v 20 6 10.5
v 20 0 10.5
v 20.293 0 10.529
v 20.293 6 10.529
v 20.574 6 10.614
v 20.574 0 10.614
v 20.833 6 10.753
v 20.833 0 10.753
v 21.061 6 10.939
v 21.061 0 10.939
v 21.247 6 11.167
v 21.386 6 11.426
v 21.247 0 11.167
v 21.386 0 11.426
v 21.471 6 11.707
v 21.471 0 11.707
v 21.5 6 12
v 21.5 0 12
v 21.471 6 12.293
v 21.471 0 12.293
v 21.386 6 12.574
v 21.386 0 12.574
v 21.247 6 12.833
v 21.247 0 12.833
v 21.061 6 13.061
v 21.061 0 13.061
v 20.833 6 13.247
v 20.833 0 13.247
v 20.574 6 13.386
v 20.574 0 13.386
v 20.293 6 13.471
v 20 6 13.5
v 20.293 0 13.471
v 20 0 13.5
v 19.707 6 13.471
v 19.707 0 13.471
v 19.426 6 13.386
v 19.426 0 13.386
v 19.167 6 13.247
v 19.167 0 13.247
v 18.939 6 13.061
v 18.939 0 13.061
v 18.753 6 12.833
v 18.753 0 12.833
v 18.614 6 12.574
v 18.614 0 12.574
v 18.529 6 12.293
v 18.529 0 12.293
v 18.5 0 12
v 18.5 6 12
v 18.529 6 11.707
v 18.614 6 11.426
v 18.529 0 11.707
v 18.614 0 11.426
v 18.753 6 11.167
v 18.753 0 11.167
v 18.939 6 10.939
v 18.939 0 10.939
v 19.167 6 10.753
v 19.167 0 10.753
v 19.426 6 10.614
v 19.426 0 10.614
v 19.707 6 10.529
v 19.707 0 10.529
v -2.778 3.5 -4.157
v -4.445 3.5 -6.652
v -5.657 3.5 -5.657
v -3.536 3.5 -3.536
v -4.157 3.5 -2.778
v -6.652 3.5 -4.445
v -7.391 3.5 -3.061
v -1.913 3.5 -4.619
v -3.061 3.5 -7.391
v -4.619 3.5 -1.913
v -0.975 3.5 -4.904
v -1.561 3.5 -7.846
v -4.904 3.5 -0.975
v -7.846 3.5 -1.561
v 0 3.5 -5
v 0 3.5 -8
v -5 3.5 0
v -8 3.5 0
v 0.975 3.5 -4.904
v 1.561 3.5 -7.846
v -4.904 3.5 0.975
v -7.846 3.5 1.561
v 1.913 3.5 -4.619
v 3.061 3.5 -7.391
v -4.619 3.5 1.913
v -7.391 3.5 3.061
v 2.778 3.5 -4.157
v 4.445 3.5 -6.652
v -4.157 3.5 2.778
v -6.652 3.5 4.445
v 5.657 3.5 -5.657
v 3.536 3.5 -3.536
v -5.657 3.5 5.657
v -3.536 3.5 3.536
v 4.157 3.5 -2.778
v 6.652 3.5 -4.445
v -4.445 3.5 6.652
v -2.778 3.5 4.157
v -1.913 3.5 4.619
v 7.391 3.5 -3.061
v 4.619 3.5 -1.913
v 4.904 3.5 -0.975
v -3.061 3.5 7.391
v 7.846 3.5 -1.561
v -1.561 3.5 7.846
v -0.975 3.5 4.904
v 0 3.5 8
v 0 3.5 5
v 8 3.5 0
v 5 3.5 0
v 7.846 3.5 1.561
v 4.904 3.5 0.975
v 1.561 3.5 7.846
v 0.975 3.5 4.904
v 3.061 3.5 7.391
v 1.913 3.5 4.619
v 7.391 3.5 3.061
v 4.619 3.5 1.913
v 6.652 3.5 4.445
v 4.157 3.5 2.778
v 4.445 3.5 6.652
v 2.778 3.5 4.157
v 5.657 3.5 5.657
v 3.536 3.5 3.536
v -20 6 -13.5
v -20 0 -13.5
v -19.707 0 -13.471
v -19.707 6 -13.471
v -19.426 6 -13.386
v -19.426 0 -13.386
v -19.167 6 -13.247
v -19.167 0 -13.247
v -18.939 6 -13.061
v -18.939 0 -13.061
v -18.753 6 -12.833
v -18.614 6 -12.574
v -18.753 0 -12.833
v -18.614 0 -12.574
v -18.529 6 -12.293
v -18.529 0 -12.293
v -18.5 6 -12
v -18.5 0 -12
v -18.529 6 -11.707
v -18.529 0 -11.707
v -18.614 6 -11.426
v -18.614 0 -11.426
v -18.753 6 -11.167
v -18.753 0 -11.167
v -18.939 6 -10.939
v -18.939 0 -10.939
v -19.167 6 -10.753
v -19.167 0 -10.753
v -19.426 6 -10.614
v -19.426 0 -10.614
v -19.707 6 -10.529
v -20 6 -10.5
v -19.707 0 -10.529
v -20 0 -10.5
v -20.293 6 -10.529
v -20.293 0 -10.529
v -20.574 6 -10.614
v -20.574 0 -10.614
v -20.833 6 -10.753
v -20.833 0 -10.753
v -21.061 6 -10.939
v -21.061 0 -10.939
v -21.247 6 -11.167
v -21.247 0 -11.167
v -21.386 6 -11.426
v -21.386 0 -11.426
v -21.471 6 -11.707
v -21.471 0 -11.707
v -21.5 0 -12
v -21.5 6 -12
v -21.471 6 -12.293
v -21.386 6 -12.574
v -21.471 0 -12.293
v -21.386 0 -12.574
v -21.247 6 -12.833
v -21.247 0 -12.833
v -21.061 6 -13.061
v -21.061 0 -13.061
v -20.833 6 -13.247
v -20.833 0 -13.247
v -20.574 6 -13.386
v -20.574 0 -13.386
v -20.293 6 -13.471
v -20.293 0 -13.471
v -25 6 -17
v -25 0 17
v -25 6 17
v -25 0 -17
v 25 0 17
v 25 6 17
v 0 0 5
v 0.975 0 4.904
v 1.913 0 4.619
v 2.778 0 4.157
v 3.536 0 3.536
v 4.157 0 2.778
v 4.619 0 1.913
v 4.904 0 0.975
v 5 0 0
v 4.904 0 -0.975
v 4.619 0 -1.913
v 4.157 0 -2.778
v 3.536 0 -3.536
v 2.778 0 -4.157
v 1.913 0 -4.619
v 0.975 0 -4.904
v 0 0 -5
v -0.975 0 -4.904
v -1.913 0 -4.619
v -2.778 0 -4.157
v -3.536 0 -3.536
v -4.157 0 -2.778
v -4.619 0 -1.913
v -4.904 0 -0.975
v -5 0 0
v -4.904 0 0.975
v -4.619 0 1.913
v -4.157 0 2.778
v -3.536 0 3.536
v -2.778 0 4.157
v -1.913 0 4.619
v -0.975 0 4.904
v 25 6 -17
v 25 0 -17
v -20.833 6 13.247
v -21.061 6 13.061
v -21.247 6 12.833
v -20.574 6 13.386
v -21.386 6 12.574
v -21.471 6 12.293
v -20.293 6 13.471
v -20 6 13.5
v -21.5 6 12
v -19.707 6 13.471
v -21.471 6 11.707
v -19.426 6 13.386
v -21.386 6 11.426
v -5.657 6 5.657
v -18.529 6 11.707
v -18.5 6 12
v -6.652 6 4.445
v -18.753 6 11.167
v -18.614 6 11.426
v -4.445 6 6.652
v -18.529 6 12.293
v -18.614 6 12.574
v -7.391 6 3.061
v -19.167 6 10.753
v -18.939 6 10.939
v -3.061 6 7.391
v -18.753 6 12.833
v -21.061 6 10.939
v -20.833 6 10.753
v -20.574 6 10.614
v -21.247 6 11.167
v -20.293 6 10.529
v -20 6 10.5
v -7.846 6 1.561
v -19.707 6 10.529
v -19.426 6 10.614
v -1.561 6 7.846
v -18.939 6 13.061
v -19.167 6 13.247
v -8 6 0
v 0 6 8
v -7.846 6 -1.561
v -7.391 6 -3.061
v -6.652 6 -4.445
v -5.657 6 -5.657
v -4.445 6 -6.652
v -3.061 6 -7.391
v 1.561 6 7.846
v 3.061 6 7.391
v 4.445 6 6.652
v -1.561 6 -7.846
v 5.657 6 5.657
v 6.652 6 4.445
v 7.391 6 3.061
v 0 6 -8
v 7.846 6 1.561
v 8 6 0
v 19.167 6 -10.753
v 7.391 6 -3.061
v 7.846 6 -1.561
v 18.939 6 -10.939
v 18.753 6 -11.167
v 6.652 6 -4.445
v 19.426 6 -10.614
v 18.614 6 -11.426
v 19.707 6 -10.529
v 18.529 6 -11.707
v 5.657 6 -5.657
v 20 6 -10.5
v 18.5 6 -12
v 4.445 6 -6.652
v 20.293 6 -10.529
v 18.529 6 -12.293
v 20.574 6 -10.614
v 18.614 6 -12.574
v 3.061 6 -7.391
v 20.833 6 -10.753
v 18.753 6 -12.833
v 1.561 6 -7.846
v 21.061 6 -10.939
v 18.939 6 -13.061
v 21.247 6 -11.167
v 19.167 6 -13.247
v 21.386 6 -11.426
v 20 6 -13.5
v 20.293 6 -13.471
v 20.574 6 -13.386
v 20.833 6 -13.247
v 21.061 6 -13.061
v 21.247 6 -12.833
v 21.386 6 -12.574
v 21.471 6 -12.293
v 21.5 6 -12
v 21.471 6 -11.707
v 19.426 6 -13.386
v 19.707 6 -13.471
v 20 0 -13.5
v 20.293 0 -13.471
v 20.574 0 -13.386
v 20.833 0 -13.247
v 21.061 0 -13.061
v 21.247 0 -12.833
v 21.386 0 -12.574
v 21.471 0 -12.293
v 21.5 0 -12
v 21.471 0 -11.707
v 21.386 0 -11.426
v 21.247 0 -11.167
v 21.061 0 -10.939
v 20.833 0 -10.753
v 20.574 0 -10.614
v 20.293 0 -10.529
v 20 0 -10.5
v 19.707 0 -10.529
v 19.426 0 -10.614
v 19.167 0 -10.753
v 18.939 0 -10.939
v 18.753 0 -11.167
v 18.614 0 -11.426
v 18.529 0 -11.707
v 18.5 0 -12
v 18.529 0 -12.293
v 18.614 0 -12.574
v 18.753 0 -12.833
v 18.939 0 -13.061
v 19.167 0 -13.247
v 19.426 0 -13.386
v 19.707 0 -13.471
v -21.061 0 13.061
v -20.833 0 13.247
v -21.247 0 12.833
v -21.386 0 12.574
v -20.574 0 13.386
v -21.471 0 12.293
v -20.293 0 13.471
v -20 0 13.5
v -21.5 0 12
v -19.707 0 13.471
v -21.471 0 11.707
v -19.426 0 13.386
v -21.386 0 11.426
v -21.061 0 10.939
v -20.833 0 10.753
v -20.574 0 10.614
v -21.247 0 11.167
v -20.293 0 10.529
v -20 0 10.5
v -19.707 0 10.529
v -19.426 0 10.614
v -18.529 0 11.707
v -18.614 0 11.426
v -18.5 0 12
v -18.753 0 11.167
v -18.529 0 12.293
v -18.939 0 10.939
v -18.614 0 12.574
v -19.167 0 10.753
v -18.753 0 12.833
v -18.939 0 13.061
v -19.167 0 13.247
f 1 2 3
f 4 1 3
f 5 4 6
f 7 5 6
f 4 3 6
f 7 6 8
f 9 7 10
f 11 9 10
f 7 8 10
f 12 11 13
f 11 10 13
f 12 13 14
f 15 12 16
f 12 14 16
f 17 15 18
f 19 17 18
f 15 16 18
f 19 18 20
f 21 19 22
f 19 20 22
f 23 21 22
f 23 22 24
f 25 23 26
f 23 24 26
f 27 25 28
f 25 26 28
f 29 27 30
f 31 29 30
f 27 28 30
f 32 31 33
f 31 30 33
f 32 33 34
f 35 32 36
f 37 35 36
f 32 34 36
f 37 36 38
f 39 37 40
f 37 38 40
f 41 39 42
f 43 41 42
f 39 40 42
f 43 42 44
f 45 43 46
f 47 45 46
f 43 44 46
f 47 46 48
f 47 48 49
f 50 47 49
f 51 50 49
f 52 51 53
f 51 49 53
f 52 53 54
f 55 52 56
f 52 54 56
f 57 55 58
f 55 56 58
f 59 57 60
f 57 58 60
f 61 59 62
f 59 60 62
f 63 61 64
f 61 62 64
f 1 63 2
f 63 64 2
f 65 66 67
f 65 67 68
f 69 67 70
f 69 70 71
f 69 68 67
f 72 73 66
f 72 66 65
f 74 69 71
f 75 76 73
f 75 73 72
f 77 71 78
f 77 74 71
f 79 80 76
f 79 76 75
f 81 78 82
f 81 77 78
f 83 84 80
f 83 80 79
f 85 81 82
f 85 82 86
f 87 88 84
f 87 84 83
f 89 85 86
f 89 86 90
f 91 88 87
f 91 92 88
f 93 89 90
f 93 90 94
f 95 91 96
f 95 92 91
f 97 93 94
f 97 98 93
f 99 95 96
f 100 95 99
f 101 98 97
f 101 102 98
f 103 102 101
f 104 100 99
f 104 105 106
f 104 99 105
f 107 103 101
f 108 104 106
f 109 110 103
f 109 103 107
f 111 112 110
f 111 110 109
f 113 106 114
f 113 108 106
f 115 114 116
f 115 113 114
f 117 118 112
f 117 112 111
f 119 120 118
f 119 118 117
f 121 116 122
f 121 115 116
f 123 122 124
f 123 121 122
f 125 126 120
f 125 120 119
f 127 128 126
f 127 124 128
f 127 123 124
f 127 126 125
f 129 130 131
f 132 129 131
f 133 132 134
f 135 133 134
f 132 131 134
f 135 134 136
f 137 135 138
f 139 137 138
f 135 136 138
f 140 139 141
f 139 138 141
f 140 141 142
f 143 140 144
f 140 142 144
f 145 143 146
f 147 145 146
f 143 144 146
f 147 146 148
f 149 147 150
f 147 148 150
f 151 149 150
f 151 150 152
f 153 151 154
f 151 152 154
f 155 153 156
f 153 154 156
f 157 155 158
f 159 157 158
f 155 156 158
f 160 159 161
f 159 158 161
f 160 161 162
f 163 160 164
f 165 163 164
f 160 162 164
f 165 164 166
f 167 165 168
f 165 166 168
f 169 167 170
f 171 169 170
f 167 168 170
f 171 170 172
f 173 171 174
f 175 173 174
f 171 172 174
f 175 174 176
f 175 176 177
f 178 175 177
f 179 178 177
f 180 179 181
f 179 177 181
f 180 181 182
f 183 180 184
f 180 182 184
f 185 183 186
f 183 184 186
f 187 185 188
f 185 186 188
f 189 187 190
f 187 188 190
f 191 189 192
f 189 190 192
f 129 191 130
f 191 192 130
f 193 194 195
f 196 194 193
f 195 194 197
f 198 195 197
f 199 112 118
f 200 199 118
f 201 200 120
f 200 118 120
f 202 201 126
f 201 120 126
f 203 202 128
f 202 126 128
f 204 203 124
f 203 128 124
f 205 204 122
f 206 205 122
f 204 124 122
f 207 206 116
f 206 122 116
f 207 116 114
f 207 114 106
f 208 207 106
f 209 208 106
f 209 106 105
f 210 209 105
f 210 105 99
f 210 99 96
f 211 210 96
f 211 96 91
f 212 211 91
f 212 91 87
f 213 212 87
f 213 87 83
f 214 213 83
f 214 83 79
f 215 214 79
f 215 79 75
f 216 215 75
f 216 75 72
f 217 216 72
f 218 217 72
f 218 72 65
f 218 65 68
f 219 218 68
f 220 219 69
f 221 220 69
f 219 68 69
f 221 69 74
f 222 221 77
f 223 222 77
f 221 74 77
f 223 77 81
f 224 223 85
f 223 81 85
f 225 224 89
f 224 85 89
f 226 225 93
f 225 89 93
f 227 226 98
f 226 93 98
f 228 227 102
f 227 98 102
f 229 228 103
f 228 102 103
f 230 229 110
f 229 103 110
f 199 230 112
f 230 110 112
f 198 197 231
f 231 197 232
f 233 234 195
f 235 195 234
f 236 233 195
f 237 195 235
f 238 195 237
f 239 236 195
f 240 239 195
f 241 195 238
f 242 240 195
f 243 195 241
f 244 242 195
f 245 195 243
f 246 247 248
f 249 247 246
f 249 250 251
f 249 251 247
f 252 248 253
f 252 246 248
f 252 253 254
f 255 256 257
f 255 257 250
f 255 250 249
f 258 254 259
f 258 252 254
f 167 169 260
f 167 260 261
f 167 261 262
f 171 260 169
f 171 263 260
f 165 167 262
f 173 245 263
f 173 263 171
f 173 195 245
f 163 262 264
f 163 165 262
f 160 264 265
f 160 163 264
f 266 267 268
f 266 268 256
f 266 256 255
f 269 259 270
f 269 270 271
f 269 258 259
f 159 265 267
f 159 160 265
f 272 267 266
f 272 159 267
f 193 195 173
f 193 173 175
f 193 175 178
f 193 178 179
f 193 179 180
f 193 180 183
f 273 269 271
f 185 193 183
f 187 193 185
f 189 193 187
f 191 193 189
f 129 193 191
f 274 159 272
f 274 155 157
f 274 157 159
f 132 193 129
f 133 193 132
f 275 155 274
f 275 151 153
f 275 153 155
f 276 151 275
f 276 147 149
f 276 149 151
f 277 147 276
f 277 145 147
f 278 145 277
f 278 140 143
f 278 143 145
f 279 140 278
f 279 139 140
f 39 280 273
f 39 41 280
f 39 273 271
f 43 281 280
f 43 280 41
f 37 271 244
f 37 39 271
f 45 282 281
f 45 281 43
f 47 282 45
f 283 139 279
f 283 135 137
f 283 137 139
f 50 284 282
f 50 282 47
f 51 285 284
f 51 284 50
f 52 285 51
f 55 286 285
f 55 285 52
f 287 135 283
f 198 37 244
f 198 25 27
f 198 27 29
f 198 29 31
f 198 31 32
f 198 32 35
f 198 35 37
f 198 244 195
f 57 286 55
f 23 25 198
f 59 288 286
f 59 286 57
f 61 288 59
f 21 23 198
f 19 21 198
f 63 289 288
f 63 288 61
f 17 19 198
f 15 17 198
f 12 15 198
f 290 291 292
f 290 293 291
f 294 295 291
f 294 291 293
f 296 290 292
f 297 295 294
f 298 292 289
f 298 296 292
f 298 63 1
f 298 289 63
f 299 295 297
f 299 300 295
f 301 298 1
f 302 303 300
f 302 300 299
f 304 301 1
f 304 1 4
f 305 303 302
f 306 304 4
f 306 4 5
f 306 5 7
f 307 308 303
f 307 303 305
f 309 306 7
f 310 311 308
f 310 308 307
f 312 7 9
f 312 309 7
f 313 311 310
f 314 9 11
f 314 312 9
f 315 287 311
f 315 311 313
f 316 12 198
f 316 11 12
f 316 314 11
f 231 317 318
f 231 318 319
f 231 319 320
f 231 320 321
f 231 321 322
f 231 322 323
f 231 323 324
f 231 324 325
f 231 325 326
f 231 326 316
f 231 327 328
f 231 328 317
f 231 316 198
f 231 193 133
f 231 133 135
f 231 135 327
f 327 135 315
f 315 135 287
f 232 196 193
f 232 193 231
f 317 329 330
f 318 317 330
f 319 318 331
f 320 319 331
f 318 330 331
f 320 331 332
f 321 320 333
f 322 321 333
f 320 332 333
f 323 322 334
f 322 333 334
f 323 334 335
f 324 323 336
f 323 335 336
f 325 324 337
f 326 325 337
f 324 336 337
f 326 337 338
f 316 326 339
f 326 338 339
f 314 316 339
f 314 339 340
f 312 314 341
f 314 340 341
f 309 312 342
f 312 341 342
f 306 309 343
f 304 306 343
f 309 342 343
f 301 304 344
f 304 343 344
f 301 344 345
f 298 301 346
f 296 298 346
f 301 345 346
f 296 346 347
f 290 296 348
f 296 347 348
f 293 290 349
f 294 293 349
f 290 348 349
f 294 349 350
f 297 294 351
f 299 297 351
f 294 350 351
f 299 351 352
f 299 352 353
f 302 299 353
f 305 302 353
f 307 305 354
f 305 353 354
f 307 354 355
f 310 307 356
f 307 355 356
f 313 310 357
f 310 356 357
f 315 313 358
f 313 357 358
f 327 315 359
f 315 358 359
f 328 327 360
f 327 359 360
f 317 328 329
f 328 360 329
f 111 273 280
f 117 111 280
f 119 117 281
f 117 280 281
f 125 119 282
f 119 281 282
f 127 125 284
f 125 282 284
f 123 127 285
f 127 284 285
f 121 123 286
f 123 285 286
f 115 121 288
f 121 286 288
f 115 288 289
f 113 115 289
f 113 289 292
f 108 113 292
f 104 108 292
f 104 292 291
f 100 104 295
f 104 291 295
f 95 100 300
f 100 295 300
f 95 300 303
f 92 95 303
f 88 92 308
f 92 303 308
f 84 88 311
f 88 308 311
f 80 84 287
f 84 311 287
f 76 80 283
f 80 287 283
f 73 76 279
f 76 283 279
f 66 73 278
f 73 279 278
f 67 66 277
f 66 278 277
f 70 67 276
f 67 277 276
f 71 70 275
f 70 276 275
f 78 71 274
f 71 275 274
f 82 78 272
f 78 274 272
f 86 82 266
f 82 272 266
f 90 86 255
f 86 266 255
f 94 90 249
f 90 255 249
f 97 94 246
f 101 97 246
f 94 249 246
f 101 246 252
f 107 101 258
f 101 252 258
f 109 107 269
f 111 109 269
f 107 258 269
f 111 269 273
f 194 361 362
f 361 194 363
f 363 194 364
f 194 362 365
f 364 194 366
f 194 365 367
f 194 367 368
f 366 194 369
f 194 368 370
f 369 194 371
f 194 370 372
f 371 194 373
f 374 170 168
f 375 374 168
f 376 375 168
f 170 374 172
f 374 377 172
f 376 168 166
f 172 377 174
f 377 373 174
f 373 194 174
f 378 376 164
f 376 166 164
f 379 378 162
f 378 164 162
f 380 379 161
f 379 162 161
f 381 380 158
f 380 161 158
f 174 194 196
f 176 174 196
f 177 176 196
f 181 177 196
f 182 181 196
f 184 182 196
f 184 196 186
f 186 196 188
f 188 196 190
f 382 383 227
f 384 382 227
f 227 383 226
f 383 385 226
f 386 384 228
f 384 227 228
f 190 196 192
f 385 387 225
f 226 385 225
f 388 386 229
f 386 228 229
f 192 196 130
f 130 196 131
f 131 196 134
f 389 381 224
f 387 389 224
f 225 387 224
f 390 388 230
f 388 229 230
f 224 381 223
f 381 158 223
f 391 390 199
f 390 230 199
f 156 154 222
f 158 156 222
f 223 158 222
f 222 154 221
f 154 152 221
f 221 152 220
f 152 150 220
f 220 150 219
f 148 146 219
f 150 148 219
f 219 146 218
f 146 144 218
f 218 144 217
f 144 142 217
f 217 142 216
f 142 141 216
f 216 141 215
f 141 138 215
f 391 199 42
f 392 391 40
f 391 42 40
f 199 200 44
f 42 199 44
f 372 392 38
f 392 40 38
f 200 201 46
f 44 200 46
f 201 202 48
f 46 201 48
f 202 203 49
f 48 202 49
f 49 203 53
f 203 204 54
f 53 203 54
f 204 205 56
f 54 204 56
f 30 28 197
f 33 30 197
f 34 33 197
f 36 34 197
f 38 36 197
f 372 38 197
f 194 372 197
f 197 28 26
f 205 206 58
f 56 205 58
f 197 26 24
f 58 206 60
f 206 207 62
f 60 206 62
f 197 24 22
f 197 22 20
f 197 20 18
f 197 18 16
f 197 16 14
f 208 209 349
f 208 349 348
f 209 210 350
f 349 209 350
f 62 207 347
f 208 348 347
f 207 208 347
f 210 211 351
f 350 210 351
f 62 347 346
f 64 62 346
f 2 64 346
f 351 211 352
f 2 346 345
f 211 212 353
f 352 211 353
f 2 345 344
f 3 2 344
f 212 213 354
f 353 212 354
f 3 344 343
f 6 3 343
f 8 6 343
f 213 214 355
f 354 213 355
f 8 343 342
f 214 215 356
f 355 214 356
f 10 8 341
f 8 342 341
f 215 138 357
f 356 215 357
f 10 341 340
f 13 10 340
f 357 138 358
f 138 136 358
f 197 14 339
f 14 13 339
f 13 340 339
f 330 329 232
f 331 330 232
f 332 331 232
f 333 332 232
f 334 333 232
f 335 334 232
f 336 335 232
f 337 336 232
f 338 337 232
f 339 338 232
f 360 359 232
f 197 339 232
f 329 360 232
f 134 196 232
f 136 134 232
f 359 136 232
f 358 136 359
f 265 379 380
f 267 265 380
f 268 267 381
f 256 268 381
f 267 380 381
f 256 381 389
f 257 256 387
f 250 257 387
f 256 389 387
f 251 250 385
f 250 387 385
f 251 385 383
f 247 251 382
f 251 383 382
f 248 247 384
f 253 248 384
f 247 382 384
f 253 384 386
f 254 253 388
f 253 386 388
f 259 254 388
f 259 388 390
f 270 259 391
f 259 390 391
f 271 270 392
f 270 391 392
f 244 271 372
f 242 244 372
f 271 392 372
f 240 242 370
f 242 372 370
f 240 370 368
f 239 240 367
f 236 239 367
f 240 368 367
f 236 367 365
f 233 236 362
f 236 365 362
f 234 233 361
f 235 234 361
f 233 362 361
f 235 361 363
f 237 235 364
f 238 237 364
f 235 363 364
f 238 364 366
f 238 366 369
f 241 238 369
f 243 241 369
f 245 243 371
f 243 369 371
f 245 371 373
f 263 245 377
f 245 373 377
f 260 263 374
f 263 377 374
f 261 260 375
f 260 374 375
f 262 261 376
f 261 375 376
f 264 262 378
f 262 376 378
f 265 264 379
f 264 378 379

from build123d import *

# Parameters (mm, degrees)
SKETCH1_W                                = 50
SKETCH1_H                                = 34
BEARING_HOLDER_PLATE_BOSS_EXTRUDE1_DEPTH = 6
SKETCH3_R                                = 1.5
MOUNTING_HOLES_CUT_EXTRUDE1_DEPTH        = 6
SKETCH4_R                                = 5
SHAFT_CUT_EXTRUDE2_DEPTH                 = 6
SKETCH5_R                                = 8
BEARING_CUT_EXTRUDE3_DEPTH               = 2.5


with BuildPart() as part:
    # Sketch1 → Bearing Holder Plate Boss-Extrude1 (new body)
    with BuildSketch(Plane(origin=(0, 0, 0), x_dir=(1, 0, 0), z_dir=(0, 1, 0))):
        Rectangle(SKETCH1_W, SKETCH1_H)
    extrude(amount=BEARING_HOLDER_PLATE_BOSS_EXTRUDE1_DEPTH)

    # Sketch3 → Mounting Holes Cut-Extrude1 (cut)
    with BuildSketch(Plane.XZ):
        with Locations(Location((20, 12, 0), (0, 0, 270))):
            Circle(SKETCH3_R)
        with Locations(Location((-20, 12, 0), (0, 0, 270))):
            Circle(SKETCH3_R)
        with Locations(Location((-20, -12, 0), (0, 0, 270))):
            Circle(SKETCH3_R)
        with Locations(Location((20, -12, 0), (0, 0, 270))):
            Circle(SKETCH3_R)
    extrude(amount=-MOUNTING_HOLES_CUT_EXTRUDE1_DEPTH, mode=Mode.SUBTRACT)

    # Sketch4 → Shaft Cut-Extrude2 (cut)
    with BuildSketch(Plane(origin=(0, 6, 0), x_dir=(1, 0, 0), z_dir=(0, 1, 0))):
        with Locations(Location((0, 0, 0), (0, 0, 270))):
            Circle(SKETCH4_R)
    extrude(amount=-SHAFT_CUT_EXTRUDE2_DEPTH, mode=Mode.SUBTRACT)

    # Sketch5 → Bearing Cut-Extrude3 (cut)
    with BuildSketch(Plane(origin=(0, 6, 0), x_dir=(1, 0, 0), z_dir=(0, 1, 0))):
        with Locations(Location((0, 0, 0), (0, 0, 270))):
            Circle(SKETCH5_R)
    extrude(amount=-BEARING_CUT_EXTRUDE3_DEPTH, mode=Mode.SUBTRACT)


solid = part.part
